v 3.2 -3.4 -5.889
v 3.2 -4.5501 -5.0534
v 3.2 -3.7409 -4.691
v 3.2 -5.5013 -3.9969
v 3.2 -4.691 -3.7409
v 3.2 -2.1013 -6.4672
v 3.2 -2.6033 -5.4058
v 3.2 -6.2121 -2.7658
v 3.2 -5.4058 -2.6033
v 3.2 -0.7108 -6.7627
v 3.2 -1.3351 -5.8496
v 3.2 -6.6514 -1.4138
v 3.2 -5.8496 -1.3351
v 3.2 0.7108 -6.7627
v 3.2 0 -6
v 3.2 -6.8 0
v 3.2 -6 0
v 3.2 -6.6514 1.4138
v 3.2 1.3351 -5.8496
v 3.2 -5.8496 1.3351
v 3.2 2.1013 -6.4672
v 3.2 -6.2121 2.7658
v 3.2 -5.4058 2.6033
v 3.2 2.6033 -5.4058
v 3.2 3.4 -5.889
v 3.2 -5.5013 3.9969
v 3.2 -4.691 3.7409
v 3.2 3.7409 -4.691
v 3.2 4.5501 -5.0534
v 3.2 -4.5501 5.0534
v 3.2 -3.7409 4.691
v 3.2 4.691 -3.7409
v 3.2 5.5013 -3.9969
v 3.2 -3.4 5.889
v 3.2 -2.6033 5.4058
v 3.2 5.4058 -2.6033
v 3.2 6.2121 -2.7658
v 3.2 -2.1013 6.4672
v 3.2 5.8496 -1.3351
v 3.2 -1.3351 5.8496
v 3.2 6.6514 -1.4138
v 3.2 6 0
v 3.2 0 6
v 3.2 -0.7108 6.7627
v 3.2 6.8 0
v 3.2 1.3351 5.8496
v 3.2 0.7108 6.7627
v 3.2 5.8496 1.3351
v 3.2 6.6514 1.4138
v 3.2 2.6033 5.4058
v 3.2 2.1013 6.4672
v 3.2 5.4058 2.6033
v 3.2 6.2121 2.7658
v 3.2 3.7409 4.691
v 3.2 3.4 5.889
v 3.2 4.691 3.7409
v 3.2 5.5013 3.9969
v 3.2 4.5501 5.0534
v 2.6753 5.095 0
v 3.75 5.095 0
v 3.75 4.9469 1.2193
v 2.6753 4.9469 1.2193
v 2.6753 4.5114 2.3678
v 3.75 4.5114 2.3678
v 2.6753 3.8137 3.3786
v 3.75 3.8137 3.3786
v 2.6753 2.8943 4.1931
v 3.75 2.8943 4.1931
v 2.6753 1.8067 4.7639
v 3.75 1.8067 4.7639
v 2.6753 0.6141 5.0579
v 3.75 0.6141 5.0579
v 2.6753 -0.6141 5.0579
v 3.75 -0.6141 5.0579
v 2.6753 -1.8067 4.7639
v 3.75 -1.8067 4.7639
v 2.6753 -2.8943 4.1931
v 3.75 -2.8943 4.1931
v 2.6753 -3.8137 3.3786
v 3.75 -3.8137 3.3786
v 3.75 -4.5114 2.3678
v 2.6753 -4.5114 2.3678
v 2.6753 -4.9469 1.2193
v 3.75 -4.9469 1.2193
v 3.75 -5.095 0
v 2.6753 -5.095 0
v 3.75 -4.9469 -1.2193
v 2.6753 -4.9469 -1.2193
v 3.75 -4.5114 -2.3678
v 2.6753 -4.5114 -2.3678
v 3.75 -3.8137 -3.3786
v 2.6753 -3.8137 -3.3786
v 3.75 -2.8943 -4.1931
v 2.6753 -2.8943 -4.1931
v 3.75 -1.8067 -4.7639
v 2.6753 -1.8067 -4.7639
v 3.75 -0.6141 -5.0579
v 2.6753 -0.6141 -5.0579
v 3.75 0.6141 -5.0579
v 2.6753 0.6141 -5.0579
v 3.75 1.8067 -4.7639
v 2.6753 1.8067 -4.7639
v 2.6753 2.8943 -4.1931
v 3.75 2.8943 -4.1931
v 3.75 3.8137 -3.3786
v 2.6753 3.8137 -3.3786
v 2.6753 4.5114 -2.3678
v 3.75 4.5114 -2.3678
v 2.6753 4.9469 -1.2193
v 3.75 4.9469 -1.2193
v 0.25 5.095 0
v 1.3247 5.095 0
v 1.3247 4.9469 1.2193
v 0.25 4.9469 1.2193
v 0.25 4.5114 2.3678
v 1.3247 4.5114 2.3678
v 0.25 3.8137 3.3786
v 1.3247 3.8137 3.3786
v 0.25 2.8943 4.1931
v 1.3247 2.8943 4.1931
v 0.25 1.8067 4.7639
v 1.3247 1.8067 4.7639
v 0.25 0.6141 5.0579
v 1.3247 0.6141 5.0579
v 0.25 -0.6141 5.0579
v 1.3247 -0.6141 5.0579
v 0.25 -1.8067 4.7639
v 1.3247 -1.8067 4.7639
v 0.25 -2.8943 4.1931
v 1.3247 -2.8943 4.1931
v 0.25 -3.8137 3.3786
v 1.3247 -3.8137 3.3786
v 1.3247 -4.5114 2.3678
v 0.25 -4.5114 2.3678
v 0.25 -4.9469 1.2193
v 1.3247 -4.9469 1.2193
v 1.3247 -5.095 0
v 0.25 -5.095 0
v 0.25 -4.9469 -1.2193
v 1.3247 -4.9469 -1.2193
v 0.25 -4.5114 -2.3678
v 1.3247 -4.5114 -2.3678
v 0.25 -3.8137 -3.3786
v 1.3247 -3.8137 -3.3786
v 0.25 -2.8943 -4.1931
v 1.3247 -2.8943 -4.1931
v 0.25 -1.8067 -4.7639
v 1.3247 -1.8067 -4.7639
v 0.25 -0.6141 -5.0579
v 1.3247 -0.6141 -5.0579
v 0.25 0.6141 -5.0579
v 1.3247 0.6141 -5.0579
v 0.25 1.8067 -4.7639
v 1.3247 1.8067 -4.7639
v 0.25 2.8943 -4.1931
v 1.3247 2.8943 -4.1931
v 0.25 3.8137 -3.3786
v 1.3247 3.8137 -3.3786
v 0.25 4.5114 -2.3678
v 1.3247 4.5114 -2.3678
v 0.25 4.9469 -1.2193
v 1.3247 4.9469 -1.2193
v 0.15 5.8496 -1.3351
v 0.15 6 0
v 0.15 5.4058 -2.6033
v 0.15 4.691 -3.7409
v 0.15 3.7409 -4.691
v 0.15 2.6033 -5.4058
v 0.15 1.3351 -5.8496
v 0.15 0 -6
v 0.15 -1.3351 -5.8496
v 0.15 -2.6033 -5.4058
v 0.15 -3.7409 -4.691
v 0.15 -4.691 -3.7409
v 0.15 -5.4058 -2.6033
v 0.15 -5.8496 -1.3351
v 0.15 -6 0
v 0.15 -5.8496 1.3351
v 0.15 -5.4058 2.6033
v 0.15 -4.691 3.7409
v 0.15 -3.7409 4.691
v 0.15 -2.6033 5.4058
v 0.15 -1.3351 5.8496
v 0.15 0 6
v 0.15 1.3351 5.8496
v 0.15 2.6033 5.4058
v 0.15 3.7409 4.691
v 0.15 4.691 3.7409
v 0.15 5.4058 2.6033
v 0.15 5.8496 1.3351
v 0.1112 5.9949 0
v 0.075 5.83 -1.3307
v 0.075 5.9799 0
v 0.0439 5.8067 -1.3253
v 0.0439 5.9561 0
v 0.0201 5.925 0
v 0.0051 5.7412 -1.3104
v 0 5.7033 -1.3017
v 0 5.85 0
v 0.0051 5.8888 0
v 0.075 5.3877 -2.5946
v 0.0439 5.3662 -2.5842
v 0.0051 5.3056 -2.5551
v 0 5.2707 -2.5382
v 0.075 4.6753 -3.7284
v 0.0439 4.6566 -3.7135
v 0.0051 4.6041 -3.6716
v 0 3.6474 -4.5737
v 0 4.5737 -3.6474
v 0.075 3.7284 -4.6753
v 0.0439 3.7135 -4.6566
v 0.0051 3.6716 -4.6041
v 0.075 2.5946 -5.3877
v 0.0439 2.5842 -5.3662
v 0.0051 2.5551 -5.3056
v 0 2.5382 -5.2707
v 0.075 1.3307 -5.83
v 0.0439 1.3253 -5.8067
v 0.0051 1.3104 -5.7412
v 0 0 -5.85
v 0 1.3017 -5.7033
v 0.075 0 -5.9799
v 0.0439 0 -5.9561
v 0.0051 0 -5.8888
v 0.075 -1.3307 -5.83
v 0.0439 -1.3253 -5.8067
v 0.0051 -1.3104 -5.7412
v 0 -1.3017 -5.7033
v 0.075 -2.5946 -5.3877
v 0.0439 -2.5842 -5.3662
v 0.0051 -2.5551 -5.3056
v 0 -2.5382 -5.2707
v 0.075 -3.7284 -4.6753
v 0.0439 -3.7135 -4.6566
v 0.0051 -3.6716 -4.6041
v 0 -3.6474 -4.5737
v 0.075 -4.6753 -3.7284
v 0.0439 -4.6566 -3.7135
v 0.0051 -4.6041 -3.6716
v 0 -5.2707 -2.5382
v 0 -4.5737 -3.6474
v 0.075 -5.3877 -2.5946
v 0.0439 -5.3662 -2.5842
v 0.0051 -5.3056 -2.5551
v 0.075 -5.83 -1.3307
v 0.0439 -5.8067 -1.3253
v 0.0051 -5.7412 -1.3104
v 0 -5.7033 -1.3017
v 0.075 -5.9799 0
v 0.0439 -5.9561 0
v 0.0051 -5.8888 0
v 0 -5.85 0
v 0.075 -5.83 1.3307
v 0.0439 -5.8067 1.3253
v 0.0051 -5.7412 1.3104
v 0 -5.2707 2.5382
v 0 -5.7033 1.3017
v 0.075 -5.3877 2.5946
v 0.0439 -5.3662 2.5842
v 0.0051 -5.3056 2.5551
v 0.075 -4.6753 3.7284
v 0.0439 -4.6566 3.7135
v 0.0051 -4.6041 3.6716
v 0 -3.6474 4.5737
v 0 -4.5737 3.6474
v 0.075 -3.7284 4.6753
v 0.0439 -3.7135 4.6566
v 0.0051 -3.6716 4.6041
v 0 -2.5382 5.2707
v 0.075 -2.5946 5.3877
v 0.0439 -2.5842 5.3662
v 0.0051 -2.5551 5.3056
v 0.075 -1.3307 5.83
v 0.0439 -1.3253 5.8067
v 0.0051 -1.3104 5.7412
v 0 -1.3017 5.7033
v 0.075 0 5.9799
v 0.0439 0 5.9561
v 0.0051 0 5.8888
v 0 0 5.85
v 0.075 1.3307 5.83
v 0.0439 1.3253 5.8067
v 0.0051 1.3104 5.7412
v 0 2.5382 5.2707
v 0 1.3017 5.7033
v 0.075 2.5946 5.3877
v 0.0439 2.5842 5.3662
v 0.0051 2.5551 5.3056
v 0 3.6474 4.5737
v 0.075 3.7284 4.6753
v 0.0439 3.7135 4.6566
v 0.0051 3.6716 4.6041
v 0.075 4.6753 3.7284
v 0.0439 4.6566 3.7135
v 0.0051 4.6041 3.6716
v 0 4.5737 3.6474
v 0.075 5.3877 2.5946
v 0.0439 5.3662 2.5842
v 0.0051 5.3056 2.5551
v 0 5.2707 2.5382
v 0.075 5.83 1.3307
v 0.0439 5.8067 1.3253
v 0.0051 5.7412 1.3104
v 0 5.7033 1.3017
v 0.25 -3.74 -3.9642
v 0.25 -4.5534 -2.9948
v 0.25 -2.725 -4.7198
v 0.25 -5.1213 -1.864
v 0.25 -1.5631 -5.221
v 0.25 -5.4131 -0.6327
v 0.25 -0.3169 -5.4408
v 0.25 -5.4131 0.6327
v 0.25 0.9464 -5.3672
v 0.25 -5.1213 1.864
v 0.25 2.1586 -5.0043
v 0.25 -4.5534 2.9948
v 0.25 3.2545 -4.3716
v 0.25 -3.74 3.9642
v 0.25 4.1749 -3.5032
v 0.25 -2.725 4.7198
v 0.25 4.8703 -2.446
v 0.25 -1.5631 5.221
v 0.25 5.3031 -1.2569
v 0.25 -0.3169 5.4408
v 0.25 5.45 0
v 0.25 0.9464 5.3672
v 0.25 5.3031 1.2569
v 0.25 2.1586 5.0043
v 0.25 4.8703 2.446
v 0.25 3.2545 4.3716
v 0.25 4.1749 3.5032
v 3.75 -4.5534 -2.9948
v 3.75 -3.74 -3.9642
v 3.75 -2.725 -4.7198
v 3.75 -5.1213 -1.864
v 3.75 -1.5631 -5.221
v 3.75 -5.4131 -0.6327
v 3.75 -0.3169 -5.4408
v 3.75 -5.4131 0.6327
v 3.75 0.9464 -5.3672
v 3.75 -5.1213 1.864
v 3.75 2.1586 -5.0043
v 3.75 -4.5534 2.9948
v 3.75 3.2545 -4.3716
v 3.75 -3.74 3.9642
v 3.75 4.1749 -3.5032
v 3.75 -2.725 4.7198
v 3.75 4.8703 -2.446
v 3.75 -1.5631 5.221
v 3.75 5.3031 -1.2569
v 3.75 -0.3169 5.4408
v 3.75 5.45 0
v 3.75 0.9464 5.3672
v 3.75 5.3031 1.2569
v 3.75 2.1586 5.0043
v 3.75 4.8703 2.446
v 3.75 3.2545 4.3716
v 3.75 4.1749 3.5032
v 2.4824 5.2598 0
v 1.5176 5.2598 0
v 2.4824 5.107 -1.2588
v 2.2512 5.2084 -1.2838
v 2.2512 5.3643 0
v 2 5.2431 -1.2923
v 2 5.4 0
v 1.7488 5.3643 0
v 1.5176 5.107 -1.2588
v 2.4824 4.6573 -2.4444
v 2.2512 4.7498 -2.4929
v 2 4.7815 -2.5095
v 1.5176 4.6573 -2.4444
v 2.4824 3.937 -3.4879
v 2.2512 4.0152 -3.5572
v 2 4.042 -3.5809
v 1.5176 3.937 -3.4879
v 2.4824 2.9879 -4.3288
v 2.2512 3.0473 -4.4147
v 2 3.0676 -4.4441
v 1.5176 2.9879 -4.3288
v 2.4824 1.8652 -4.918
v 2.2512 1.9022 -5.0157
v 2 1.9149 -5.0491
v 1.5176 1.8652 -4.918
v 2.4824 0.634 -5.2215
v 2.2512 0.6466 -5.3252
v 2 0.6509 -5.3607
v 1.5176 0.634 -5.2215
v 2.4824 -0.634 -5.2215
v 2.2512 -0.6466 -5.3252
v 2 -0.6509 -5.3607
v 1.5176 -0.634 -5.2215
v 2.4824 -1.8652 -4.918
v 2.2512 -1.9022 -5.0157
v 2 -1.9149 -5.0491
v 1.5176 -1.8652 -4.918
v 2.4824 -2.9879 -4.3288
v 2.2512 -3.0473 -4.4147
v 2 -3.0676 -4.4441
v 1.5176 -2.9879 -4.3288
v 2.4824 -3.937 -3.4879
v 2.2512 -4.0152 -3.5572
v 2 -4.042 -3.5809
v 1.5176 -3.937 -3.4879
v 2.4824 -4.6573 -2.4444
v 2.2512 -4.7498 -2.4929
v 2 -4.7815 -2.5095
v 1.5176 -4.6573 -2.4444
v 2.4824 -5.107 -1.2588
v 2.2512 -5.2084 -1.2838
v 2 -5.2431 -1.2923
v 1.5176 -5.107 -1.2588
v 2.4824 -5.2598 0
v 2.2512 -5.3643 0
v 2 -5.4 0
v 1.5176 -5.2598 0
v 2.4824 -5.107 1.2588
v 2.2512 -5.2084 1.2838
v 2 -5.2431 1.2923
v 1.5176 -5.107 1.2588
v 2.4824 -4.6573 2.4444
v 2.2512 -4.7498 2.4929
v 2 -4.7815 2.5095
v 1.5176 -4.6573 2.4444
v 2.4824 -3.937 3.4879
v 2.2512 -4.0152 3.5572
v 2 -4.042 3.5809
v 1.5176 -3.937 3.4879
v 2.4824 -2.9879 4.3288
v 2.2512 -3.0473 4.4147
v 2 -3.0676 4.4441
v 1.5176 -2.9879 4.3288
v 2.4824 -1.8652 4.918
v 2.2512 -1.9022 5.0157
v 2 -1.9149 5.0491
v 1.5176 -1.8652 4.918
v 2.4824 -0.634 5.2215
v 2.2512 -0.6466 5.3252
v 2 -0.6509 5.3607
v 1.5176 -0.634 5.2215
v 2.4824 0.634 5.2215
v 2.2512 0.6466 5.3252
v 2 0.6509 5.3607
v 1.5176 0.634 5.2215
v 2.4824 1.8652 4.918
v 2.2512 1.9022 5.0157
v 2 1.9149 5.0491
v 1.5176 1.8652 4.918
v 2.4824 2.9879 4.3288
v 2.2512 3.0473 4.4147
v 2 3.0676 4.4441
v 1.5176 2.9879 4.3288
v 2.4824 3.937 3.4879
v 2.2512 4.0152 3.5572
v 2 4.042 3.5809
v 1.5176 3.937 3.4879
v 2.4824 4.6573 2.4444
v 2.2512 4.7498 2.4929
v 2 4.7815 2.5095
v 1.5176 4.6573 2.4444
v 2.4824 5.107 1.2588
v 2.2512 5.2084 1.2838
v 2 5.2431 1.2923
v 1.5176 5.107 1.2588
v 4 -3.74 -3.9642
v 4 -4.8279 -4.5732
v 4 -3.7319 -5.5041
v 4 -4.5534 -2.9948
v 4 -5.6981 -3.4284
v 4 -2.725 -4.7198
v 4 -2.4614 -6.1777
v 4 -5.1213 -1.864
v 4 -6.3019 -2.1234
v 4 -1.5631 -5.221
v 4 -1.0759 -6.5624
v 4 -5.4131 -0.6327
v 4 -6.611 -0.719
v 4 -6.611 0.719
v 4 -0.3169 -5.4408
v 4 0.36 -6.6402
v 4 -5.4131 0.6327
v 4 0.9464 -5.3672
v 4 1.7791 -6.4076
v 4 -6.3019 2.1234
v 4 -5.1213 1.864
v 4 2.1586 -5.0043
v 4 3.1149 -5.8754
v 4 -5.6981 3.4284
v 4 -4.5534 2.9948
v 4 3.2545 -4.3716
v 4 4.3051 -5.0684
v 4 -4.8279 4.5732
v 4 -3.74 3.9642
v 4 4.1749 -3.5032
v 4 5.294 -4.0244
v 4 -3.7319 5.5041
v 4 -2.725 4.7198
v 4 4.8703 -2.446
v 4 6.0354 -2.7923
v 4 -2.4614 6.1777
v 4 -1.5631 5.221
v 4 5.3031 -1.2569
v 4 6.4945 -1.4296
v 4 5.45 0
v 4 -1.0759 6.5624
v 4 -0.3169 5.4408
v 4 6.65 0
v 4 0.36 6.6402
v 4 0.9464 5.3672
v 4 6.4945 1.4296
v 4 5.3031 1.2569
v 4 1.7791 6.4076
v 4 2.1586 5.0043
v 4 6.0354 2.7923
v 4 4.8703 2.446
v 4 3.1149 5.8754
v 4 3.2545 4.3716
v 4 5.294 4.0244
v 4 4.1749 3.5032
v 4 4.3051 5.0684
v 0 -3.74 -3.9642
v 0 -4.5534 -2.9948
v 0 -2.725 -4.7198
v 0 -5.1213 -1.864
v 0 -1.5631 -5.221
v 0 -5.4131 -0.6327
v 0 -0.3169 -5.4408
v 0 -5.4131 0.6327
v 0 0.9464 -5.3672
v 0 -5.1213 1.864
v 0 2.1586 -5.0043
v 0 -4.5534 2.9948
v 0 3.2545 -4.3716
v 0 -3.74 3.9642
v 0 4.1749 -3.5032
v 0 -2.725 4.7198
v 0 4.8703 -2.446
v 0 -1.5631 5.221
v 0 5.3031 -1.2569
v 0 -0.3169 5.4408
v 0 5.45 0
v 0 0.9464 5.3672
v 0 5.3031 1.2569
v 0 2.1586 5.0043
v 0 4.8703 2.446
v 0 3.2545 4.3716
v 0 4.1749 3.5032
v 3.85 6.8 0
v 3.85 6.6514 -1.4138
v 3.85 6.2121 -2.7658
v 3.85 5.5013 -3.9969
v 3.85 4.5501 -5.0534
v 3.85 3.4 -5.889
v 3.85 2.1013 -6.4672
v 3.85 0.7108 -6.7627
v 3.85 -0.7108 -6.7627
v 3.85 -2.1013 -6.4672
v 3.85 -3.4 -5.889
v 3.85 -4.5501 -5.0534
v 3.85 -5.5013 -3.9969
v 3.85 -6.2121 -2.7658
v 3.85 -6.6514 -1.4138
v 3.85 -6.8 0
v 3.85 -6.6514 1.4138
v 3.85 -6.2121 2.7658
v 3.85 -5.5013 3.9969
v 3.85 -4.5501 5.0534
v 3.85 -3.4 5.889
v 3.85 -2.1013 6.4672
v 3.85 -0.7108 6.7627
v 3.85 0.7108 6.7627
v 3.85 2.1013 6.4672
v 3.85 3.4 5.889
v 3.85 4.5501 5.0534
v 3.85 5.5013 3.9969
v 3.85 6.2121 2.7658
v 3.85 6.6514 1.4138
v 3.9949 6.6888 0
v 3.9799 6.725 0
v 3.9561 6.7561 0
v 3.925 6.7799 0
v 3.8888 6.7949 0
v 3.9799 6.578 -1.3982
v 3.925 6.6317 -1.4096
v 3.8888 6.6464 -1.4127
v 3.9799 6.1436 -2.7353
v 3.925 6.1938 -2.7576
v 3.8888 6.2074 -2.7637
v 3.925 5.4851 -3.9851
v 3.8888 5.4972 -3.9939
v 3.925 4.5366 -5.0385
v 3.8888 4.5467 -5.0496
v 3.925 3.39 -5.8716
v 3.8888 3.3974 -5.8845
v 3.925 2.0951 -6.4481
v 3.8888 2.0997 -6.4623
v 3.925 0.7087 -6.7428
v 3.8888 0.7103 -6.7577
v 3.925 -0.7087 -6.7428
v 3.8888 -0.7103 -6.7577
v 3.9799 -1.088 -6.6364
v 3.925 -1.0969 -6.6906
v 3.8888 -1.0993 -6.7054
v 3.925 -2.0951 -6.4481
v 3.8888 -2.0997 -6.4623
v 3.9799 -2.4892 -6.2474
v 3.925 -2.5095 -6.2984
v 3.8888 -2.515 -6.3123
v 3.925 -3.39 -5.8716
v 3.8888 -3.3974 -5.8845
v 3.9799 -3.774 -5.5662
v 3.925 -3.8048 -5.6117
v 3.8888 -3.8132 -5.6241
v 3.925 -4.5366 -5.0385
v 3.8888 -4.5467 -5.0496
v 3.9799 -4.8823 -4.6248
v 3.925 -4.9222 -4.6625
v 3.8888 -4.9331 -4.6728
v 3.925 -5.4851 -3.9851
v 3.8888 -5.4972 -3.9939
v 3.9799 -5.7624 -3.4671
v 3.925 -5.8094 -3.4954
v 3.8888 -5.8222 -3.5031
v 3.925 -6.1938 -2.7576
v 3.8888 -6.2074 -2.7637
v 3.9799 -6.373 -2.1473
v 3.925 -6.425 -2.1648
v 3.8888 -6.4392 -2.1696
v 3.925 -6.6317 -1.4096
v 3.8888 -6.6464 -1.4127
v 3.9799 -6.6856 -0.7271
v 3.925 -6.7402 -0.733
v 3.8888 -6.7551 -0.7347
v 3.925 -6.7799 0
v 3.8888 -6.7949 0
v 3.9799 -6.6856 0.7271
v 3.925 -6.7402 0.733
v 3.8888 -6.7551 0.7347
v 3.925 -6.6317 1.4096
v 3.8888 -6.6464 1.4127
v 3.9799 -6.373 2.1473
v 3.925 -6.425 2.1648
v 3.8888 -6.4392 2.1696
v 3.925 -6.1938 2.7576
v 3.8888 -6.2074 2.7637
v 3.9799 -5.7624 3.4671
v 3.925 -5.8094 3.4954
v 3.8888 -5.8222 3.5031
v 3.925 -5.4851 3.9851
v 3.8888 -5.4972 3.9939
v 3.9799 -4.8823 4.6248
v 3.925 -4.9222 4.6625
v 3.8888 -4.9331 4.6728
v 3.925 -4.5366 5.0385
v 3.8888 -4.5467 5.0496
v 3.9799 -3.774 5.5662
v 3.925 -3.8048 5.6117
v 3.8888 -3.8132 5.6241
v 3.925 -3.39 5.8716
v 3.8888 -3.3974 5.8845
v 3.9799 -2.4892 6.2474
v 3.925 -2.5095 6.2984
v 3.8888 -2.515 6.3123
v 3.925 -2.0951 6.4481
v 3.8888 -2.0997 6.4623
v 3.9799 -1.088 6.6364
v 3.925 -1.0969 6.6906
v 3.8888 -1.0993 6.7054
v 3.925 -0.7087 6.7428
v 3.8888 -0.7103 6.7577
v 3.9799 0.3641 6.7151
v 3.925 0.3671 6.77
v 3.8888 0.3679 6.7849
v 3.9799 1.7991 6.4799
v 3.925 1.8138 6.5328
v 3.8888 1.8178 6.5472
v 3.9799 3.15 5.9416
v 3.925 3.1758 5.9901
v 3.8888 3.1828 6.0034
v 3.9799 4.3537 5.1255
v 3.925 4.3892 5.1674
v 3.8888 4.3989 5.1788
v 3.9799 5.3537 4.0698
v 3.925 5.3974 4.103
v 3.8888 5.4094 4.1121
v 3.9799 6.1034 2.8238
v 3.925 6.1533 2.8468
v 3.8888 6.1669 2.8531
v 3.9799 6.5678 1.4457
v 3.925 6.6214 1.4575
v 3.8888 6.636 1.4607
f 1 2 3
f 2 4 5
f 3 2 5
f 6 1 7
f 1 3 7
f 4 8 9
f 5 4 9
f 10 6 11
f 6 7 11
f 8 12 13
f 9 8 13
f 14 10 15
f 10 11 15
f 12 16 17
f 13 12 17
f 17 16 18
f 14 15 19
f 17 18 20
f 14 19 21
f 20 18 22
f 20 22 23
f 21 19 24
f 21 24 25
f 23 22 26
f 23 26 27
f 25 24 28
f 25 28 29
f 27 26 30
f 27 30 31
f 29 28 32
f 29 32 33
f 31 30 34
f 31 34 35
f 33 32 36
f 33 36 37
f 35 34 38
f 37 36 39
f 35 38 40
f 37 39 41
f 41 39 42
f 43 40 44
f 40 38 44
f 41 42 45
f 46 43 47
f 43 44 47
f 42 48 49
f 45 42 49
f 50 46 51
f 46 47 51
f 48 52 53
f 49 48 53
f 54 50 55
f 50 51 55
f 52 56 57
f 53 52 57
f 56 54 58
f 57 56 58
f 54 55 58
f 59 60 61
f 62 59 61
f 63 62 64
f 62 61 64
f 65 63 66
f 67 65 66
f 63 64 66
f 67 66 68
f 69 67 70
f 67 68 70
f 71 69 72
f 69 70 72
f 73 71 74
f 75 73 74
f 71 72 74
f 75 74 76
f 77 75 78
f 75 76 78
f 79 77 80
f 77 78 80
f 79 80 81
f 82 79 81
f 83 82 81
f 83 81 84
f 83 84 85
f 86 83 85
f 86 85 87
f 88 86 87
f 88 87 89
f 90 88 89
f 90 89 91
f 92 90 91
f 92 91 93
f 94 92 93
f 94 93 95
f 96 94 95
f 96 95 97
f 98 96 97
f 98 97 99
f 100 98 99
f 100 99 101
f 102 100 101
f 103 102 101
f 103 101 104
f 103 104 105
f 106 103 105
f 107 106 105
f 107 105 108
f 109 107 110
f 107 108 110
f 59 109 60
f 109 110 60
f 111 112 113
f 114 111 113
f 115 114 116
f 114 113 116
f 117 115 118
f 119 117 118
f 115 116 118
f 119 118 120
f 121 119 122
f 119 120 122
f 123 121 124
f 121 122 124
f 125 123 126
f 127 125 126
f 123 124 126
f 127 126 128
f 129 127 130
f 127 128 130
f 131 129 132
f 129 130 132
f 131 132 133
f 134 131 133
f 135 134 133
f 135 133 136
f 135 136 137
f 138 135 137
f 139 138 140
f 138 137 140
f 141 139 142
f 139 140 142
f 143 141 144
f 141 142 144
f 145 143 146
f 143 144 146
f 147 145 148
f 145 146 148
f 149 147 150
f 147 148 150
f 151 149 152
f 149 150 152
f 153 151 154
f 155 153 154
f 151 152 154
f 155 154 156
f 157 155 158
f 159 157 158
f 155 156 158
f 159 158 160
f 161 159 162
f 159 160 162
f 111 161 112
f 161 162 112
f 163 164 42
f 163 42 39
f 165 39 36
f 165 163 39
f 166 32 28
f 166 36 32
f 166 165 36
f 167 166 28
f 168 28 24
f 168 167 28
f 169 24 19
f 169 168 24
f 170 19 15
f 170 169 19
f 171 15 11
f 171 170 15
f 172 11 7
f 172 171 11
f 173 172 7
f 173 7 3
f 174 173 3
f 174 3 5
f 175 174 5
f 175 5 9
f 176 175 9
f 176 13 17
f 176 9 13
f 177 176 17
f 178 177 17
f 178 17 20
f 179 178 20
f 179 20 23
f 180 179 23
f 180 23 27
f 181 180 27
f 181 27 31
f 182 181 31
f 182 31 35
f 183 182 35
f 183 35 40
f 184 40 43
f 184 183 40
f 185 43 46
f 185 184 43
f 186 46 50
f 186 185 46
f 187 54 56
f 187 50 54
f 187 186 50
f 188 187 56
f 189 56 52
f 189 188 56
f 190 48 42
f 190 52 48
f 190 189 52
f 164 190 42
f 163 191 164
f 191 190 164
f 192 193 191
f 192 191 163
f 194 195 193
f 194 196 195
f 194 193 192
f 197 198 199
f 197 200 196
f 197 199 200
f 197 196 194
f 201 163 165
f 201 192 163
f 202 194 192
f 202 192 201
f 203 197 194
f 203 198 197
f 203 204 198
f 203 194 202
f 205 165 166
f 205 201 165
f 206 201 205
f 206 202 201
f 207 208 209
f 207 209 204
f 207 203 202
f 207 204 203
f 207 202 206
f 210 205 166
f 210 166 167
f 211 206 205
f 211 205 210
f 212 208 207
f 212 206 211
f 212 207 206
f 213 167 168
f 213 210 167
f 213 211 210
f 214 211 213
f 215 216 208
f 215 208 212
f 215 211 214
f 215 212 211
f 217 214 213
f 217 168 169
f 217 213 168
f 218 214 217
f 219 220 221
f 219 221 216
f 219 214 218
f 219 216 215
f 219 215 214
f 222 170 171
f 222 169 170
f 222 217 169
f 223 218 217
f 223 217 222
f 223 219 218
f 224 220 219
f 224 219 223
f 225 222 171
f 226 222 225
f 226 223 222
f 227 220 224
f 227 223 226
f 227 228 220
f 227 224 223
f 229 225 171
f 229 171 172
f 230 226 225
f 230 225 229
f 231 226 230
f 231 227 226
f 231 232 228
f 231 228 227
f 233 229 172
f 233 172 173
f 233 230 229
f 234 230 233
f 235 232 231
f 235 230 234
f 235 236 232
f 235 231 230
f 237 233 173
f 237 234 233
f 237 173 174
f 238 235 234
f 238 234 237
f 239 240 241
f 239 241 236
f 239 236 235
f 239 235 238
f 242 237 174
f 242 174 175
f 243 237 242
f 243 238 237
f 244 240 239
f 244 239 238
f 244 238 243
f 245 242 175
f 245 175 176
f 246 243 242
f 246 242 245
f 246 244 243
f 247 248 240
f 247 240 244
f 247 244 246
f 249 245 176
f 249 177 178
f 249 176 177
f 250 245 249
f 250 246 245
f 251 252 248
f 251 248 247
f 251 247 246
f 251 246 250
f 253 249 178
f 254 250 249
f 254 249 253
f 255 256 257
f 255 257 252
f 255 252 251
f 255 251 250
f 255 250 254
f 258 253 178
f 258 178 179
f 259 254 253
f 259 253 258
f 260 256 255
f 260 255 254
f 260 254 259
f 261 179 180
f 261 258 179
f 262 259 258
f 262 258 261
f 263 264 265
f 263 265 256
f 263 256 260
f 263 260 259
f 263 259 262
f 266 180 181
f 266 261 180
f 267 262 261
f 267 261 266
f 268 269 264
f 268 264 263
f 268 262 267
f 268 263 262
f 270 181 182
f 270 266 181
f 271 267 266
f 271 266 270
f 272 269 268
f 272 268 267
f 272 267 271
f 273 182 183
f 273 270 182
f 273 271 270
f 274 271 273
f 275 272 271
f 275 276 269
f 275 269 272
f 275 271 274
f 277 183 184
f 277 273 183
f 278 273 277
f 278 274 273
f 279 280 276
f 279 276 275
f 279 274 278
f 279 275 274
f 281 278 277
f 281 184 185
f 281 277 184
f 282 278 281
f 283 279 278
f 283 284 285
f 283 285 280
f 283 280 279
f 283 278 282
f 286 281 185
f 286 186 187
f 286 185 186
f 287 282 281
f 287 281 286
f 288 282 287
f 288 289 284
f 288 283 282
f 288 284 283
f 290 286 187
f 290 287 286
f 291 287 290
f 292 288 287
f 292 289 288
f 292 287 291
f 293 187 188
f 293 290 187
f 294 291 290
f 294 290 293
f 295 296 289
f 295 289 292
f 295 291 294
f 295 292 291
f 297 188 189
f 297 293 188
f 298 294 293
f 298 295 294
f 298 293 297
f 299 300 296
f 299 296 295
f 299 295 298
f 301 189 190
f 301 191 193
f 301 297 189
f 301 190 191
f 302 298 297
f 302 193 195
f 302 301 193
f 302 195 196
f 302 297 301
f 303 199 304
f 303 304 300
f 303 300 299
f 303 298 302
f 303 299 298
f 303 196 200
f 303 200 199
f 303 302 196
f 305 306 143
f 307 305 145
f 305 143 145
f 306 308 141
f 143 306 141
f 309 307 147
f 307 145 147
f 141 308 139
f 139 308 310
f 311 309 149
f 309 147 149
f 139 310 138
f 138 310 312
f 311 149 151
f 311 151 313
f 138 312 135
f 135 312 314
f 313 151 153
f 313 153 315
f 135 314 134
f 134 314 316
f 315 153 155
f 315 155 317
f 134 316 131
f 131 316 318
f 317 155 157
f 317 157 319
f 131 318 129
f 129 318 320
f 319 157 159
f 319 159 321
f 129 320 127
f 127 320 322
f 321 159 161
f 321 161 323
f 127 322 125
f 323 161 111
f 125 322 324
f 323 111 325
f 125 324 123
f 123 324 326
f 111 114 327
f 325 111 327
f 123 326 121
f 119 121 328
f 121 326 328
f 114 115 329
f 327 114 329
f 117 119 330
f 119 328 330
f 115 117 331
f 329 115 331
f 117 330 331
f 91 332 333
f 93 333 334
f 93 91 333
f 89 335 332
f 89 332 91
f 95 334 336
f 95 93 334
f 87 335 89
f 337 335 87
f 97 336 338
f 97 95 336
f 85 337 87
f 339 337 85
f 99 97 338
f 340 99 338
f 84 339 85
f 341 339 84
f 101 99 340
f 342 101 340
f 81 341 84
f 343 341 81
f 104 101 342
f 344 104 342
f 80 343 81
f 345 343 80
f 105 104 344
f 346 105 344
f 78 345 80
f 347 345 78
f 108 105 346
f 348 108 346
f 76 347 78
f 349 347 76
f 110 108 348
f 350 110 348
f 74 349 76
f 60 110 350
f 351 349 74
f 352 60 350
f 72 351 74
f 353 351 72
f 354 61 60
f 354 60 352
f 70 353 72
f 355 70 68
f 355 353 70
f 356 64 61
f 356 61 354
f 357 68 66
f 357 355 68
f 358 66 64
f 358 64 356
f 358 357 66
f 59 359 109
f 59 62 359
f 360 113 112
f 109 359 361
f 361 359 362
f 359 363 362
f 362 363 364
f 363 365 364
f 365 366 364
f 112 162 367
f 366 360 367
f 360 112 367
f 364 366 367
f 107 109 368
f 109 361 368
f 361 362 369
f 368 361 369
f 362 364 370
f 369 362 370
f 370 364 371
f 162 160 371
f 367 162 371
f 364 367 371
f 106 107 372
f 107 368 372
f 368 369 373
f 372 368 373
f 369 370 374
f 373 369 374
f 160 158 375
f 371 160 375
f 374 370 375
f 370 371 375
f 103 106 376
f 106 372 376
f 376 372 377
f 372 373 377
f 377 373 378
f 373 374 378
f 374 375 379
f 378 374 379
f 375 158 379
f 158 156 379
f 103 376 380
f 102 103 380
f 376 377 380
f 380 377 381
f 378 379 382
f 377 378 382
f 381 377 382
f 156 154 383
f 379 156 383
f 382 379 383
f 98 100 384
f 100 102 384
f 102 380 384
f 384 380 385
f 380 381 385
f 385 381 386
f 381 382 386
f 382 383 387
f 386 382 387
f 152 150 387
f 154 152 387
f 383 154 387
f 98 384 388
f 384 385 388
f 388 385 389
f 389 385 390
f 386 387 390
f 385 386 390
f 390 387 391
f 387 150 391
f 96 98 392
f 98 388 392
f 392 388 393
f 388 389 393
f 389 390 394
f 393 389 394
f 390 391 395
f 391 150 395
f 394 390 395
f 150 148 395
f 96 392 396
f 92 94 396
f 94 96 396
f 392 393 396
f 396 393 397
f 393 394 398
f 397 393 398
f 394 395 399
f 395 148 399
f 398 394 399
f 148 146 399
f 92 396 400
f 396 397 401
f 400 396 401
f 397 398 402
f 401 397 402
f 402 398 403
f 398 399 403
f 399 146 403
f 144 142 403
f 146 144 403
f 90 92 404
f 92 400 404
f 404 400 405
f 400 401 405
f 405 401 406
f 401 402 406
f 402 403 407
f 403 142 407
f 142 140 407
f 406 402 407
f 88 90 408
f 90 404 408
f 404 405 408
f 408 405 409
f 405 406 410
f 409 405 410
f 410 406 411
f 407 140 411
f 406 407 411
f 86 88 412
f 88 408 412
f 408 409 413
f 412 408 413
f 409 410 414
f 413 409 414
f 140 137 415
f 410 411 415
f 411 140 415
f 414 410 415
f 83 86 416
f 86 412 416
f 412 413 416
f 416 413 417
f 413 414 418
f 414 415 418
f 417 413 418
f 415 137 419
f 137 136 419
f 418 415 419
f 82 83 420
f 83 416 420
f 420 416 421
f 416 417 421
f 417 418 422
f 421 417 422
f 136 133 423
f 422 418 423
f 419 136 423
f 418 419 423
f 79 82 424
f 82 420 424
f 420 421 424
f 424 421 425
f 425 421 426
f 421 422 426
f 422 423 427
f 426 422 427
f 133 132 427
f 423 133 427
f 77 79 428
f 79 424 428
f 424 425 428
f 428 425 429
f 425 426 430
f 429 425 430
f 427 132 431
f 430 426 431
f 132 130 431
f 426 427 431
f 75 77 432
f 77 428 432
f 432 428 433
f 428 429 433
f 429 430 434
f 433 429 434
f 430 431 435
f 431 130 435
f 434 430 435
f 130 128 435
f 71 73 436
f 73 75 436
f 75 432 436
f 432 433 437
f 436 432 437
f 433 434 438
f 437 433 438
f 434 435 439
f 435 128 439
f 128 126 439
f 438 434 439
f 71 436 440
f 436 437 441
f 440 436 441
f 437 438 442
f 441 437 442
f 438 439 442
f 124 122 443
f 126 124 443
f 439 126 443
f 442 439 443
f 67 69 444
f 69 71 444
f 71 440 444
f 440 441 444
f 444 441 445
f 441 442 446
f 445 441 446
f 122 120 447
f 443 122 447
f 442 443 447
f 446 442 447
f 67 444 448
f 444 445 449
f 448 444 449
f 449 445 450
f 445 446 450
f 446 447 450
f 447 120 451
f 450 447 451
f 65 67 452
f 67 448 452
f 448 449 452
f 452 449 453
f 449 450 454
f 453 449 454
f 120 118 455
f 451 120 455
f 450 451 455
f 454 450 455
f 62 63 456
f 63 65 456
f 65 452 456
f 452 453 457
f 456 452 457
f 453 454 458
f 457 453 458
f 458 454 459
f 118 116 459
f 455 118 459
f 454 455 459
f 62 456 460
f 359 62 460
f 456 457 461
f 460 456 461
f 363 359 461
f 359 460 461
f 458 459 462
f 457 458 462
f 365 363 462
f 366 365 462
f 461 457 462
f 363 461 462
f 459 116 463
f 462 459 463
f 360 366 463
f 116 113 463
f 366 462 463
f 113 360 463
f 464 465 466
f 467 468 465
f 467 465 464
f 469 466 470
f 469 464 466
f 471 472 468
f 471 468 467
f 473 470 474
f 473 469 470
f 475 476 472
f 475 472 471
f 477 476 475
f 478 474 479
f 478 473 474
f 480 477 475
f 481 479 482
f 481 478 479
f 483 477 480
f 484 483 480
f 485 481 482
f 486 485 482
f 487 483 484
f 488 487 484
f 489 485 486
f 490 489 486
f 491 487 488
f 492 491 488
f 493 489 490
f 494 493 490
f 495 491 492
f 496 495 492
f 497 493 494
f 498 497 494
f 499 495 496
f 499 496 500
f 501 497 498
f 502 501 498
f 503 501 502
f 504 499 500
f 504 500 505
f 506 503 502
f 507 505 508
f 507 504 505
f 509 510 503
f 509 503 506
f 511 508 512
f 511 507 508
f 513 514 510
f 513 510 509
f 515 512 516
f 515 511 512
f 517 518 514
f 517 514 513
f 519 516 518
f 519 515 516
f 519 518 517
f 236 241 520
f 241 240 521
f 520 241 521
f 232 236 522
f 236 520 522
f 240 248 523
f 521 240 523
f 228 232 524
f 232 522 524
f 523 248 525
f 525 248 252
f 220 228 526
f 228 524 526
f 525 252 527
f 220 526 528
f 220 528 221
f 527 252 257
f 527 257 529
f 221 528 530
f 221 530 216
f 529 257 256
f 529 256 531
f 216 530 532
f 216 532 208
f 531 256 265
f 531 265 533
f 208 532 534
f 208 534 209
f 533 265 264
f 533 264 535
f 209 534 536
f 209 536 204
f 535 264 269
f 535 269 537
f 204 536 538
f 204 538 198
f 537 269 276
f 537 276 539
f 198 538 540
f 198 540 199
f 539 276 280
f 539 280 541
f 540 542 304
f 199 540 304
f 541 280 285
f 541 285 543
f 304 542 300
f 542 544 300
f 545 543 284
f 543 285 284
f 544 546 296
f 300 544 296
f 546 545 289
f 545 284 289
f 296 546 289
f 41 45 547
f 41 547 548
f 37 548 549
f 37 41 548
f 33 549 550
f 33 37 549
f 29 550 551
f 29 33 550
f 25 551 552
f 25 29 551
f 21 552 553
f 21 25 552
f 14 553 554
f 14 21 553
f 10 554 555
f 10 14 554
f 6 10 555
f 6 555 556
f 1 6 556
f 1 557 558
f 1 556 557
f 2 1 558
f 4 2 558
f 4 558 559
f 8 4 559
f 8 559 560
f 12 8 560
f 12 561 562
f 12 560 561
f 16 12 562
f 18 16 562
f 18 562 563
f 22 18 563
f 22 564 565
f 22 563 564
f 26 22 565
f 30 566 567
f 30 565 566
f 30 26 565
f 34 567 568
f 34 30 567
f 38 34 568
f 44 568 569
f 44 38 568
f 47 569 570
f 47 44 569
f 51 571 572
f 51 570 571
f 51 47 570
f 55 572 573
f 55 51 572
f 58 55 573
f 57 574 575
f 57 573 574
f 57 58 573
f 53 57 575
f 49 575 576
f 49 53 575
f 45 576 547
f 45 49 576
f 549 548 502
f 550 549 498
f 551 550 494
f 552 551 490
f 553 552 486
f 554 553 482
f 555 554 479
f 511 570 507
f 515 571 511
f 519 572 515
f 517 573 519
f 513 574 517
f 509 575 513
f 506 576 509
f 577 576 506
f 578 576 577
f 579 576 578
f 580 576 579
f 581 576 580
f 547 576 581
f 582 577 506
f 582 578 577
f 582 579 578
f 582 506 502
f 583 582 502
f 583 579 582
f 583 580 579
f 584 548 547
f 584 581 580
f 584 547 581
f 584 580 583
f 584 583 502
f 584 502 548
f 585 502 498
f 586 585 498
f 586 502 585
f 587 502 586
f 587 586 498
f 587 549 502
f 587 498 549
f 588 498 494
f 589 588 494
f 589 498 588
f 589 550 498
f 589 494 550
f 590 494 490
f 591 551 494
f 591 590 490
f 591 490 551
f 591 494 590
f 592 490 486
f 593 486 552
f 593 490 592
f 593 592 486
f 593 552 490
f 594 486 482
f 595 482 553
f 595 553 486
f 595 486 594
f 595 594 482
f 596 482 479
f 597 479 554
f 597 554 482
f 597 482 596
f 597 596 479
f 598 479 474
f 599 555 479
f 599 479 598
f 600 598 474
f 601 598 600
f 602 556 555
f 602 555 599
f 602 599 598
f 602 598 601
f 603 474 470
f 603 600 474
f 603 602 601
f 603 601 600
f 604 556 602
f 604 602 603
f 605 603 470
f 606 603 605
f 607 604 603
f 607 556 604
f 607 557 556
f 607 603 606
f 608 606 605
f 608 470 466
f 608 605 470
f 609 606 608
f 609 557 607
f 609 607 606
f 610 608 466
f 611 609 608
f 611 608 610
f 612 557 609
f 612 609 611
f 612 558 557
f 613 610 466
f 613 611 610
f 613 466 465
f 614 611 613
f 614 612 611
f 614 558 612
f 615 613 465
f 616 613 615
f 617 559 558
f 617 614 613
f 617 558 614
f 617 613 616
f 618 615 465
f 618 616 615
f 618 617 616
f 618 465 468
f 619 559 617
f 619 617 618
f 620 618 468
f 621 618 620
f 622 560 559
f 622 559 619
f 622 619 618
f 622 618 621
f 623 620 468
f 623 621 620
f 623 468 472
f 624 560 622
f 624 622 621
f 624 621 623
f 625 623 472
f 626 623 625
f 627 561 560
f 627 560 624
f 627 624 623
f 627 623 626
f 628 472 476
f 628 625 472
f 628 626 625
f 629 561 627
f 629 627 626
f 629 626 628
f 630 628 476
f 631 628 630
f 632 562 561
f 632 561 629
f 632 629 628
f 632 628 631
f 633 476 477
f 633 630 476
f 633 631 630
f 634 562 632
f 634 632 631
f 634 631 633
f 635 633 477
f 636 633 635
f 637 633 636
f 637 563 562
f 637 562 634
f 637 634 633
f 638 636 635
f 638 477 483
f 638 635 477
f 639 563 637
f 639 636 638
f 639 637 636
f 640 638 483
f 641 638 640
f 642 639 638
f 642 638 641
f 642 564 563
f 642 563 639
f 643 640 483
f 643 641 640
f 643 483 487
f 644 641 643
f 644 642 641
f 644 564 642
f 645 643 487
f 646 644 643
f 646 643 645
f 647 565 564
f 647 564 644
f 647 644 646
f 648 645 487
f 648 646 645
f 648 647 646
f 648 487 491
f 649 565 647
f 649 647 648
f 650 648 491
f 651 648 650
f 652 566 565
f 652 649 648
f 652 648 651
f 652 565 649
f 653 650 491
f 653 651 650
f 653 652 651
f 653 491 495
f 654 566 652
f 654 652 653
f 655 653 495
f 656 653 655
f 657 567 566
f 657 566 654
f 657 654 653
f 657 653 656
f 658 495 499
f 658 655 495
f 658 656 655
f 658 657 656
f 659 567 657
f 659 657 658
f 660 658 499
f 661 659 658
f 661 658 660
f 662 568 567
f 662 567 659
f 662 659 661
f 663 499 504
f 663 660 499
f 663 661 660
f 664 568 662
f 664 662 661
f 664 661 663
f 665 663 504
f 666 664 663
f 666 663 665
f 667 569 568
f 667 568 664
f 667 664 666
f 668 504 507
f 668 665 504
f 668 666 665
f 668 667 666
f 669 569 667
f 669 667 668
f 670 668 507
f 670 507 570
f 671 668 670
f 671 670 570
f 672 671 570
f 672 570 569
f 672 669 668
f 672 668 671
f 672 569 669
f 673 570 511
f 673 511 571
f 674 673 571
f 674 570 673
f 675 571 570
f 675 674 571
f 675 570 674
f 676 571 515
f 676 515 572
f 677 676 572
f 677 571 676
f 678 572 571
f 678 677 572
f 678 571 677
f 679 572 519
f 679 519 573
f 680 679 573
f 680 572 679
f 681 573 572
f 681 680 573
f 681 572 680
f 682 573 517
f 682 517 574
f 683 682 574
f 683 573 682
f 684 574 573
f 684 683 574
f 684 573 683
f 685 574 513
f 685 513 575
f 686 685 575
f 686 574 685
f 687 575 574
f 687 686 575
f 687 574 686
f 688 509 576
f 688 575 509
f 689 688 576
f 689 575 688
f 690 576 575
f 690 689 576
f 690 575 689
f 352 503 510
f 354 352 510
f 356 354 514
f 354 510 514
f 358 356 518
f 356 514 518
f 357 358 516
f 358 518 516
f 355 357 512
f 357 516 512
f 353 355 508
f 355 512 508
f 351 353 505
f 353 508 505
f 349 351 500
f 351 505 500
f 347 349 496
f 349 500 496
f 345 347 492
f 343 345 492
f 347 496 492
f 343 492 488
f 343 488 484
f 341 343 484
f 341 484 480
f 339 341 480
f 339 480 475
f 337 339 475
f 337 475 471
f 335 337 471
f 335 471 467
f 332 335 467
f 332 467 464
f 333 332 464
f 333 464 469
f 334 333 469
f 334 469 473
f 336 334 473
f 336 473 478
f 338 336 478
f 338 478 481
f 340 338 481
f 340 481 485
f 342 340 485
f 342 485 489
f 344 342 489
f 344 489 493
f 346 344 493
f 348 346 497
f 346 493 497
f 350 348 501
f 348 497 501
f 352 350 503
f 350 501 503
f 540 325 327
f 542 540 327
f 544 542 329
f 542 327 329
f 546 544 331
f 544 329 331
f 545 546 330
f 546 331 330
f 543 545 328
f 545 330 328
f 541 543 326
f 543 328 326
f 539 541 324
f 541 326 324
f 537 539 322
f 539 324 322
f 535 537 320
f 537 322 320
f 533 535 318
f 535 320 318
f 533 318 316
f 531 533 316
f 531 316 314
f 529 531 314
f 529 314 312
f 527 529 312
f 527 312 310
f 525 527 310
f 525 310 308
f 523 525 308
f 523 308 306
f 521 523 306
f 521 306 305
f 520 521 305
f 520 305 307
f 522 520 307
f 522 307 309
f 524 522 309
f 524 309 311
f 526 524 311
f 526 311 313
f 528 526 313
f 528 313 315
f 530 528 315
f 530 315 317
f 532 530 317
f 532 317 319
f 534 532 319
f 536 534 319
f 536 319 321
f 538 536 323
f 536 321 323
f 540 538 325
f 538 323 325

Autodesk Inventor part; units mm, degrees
sketch "Sketch_1" plane through (0, 0, 0) normal (0, 0, 1) x (1, 0, 0)
  line L0 (4, 0) -> (0, 0)
  line L1 (0, 5.45) -> (0.25, 5.45)
  line L2 (0.25, 5.45) -> (0.25, 5.095)
  line L3 (0.25, 5.095) -> (1.3247, 5.095)
  arc A0 (2.6753, 5.095) -> (1.3247, 5.095) centre (2, 4.5) ccw
  line L4 (2.6753, 5.095) -> (3.75, 5.095)
  line L5 (3.75, 5.095) -> (3.75, 5.45)
  line L6 (3.75, 5.45) -> (4, 5.45)
  line L7 (4, 5.45) -> (4, 6.65)
  arc A1 (4, 6.65) -> (3.85, 6.8) centre (3.85, 6.65) ccw
  line L8 (3.85, 6.8) -> (3.2, 6.8)
  line L9 (3.2, 6.8) -> (3.2, 6)
  line L10 (3.2, 6) -> (0.15, 6)
  arc A2 (0.15, 6) -> (0, 5.85) centre (0.15, 5.85) ccw
  line L11 (0, 5.85) -> (0, 5.45)
revolve "Revolution1" add sketch "Sketch_1" angle 360 about axis through (4, 0, 0) along (1, 0, 0)
ref_plane "ip_st_1_XY" through (0, 0, 0) normal (1, 0, 0) x (0, 0, -1)
ref_plane "ip_st_1_YZ" through (0, 0, 0) normal (0, 0, -1) x (0, 1, 0)
ref_plane "ip_st_1_ZX" through (0, 0, 0) normal (0, 1, 0) x (1, 0, 0)
ref_plane "ip_st_2_XY" through (3.75, 0, 0) normal (-1, 0, 0) x (0, 0, -1)
ref_plane "ip_st_2_YZ" through (3.75, 0, 0) normal (0, 0, -1) x (0, -1, 0)
ref_plane "ip_st_2_ZX" through (3.75, 0, 0) normal (0, -1, 0) x (-1, 0, 0)
properties part number "MF126ZZ Outer Ring"
